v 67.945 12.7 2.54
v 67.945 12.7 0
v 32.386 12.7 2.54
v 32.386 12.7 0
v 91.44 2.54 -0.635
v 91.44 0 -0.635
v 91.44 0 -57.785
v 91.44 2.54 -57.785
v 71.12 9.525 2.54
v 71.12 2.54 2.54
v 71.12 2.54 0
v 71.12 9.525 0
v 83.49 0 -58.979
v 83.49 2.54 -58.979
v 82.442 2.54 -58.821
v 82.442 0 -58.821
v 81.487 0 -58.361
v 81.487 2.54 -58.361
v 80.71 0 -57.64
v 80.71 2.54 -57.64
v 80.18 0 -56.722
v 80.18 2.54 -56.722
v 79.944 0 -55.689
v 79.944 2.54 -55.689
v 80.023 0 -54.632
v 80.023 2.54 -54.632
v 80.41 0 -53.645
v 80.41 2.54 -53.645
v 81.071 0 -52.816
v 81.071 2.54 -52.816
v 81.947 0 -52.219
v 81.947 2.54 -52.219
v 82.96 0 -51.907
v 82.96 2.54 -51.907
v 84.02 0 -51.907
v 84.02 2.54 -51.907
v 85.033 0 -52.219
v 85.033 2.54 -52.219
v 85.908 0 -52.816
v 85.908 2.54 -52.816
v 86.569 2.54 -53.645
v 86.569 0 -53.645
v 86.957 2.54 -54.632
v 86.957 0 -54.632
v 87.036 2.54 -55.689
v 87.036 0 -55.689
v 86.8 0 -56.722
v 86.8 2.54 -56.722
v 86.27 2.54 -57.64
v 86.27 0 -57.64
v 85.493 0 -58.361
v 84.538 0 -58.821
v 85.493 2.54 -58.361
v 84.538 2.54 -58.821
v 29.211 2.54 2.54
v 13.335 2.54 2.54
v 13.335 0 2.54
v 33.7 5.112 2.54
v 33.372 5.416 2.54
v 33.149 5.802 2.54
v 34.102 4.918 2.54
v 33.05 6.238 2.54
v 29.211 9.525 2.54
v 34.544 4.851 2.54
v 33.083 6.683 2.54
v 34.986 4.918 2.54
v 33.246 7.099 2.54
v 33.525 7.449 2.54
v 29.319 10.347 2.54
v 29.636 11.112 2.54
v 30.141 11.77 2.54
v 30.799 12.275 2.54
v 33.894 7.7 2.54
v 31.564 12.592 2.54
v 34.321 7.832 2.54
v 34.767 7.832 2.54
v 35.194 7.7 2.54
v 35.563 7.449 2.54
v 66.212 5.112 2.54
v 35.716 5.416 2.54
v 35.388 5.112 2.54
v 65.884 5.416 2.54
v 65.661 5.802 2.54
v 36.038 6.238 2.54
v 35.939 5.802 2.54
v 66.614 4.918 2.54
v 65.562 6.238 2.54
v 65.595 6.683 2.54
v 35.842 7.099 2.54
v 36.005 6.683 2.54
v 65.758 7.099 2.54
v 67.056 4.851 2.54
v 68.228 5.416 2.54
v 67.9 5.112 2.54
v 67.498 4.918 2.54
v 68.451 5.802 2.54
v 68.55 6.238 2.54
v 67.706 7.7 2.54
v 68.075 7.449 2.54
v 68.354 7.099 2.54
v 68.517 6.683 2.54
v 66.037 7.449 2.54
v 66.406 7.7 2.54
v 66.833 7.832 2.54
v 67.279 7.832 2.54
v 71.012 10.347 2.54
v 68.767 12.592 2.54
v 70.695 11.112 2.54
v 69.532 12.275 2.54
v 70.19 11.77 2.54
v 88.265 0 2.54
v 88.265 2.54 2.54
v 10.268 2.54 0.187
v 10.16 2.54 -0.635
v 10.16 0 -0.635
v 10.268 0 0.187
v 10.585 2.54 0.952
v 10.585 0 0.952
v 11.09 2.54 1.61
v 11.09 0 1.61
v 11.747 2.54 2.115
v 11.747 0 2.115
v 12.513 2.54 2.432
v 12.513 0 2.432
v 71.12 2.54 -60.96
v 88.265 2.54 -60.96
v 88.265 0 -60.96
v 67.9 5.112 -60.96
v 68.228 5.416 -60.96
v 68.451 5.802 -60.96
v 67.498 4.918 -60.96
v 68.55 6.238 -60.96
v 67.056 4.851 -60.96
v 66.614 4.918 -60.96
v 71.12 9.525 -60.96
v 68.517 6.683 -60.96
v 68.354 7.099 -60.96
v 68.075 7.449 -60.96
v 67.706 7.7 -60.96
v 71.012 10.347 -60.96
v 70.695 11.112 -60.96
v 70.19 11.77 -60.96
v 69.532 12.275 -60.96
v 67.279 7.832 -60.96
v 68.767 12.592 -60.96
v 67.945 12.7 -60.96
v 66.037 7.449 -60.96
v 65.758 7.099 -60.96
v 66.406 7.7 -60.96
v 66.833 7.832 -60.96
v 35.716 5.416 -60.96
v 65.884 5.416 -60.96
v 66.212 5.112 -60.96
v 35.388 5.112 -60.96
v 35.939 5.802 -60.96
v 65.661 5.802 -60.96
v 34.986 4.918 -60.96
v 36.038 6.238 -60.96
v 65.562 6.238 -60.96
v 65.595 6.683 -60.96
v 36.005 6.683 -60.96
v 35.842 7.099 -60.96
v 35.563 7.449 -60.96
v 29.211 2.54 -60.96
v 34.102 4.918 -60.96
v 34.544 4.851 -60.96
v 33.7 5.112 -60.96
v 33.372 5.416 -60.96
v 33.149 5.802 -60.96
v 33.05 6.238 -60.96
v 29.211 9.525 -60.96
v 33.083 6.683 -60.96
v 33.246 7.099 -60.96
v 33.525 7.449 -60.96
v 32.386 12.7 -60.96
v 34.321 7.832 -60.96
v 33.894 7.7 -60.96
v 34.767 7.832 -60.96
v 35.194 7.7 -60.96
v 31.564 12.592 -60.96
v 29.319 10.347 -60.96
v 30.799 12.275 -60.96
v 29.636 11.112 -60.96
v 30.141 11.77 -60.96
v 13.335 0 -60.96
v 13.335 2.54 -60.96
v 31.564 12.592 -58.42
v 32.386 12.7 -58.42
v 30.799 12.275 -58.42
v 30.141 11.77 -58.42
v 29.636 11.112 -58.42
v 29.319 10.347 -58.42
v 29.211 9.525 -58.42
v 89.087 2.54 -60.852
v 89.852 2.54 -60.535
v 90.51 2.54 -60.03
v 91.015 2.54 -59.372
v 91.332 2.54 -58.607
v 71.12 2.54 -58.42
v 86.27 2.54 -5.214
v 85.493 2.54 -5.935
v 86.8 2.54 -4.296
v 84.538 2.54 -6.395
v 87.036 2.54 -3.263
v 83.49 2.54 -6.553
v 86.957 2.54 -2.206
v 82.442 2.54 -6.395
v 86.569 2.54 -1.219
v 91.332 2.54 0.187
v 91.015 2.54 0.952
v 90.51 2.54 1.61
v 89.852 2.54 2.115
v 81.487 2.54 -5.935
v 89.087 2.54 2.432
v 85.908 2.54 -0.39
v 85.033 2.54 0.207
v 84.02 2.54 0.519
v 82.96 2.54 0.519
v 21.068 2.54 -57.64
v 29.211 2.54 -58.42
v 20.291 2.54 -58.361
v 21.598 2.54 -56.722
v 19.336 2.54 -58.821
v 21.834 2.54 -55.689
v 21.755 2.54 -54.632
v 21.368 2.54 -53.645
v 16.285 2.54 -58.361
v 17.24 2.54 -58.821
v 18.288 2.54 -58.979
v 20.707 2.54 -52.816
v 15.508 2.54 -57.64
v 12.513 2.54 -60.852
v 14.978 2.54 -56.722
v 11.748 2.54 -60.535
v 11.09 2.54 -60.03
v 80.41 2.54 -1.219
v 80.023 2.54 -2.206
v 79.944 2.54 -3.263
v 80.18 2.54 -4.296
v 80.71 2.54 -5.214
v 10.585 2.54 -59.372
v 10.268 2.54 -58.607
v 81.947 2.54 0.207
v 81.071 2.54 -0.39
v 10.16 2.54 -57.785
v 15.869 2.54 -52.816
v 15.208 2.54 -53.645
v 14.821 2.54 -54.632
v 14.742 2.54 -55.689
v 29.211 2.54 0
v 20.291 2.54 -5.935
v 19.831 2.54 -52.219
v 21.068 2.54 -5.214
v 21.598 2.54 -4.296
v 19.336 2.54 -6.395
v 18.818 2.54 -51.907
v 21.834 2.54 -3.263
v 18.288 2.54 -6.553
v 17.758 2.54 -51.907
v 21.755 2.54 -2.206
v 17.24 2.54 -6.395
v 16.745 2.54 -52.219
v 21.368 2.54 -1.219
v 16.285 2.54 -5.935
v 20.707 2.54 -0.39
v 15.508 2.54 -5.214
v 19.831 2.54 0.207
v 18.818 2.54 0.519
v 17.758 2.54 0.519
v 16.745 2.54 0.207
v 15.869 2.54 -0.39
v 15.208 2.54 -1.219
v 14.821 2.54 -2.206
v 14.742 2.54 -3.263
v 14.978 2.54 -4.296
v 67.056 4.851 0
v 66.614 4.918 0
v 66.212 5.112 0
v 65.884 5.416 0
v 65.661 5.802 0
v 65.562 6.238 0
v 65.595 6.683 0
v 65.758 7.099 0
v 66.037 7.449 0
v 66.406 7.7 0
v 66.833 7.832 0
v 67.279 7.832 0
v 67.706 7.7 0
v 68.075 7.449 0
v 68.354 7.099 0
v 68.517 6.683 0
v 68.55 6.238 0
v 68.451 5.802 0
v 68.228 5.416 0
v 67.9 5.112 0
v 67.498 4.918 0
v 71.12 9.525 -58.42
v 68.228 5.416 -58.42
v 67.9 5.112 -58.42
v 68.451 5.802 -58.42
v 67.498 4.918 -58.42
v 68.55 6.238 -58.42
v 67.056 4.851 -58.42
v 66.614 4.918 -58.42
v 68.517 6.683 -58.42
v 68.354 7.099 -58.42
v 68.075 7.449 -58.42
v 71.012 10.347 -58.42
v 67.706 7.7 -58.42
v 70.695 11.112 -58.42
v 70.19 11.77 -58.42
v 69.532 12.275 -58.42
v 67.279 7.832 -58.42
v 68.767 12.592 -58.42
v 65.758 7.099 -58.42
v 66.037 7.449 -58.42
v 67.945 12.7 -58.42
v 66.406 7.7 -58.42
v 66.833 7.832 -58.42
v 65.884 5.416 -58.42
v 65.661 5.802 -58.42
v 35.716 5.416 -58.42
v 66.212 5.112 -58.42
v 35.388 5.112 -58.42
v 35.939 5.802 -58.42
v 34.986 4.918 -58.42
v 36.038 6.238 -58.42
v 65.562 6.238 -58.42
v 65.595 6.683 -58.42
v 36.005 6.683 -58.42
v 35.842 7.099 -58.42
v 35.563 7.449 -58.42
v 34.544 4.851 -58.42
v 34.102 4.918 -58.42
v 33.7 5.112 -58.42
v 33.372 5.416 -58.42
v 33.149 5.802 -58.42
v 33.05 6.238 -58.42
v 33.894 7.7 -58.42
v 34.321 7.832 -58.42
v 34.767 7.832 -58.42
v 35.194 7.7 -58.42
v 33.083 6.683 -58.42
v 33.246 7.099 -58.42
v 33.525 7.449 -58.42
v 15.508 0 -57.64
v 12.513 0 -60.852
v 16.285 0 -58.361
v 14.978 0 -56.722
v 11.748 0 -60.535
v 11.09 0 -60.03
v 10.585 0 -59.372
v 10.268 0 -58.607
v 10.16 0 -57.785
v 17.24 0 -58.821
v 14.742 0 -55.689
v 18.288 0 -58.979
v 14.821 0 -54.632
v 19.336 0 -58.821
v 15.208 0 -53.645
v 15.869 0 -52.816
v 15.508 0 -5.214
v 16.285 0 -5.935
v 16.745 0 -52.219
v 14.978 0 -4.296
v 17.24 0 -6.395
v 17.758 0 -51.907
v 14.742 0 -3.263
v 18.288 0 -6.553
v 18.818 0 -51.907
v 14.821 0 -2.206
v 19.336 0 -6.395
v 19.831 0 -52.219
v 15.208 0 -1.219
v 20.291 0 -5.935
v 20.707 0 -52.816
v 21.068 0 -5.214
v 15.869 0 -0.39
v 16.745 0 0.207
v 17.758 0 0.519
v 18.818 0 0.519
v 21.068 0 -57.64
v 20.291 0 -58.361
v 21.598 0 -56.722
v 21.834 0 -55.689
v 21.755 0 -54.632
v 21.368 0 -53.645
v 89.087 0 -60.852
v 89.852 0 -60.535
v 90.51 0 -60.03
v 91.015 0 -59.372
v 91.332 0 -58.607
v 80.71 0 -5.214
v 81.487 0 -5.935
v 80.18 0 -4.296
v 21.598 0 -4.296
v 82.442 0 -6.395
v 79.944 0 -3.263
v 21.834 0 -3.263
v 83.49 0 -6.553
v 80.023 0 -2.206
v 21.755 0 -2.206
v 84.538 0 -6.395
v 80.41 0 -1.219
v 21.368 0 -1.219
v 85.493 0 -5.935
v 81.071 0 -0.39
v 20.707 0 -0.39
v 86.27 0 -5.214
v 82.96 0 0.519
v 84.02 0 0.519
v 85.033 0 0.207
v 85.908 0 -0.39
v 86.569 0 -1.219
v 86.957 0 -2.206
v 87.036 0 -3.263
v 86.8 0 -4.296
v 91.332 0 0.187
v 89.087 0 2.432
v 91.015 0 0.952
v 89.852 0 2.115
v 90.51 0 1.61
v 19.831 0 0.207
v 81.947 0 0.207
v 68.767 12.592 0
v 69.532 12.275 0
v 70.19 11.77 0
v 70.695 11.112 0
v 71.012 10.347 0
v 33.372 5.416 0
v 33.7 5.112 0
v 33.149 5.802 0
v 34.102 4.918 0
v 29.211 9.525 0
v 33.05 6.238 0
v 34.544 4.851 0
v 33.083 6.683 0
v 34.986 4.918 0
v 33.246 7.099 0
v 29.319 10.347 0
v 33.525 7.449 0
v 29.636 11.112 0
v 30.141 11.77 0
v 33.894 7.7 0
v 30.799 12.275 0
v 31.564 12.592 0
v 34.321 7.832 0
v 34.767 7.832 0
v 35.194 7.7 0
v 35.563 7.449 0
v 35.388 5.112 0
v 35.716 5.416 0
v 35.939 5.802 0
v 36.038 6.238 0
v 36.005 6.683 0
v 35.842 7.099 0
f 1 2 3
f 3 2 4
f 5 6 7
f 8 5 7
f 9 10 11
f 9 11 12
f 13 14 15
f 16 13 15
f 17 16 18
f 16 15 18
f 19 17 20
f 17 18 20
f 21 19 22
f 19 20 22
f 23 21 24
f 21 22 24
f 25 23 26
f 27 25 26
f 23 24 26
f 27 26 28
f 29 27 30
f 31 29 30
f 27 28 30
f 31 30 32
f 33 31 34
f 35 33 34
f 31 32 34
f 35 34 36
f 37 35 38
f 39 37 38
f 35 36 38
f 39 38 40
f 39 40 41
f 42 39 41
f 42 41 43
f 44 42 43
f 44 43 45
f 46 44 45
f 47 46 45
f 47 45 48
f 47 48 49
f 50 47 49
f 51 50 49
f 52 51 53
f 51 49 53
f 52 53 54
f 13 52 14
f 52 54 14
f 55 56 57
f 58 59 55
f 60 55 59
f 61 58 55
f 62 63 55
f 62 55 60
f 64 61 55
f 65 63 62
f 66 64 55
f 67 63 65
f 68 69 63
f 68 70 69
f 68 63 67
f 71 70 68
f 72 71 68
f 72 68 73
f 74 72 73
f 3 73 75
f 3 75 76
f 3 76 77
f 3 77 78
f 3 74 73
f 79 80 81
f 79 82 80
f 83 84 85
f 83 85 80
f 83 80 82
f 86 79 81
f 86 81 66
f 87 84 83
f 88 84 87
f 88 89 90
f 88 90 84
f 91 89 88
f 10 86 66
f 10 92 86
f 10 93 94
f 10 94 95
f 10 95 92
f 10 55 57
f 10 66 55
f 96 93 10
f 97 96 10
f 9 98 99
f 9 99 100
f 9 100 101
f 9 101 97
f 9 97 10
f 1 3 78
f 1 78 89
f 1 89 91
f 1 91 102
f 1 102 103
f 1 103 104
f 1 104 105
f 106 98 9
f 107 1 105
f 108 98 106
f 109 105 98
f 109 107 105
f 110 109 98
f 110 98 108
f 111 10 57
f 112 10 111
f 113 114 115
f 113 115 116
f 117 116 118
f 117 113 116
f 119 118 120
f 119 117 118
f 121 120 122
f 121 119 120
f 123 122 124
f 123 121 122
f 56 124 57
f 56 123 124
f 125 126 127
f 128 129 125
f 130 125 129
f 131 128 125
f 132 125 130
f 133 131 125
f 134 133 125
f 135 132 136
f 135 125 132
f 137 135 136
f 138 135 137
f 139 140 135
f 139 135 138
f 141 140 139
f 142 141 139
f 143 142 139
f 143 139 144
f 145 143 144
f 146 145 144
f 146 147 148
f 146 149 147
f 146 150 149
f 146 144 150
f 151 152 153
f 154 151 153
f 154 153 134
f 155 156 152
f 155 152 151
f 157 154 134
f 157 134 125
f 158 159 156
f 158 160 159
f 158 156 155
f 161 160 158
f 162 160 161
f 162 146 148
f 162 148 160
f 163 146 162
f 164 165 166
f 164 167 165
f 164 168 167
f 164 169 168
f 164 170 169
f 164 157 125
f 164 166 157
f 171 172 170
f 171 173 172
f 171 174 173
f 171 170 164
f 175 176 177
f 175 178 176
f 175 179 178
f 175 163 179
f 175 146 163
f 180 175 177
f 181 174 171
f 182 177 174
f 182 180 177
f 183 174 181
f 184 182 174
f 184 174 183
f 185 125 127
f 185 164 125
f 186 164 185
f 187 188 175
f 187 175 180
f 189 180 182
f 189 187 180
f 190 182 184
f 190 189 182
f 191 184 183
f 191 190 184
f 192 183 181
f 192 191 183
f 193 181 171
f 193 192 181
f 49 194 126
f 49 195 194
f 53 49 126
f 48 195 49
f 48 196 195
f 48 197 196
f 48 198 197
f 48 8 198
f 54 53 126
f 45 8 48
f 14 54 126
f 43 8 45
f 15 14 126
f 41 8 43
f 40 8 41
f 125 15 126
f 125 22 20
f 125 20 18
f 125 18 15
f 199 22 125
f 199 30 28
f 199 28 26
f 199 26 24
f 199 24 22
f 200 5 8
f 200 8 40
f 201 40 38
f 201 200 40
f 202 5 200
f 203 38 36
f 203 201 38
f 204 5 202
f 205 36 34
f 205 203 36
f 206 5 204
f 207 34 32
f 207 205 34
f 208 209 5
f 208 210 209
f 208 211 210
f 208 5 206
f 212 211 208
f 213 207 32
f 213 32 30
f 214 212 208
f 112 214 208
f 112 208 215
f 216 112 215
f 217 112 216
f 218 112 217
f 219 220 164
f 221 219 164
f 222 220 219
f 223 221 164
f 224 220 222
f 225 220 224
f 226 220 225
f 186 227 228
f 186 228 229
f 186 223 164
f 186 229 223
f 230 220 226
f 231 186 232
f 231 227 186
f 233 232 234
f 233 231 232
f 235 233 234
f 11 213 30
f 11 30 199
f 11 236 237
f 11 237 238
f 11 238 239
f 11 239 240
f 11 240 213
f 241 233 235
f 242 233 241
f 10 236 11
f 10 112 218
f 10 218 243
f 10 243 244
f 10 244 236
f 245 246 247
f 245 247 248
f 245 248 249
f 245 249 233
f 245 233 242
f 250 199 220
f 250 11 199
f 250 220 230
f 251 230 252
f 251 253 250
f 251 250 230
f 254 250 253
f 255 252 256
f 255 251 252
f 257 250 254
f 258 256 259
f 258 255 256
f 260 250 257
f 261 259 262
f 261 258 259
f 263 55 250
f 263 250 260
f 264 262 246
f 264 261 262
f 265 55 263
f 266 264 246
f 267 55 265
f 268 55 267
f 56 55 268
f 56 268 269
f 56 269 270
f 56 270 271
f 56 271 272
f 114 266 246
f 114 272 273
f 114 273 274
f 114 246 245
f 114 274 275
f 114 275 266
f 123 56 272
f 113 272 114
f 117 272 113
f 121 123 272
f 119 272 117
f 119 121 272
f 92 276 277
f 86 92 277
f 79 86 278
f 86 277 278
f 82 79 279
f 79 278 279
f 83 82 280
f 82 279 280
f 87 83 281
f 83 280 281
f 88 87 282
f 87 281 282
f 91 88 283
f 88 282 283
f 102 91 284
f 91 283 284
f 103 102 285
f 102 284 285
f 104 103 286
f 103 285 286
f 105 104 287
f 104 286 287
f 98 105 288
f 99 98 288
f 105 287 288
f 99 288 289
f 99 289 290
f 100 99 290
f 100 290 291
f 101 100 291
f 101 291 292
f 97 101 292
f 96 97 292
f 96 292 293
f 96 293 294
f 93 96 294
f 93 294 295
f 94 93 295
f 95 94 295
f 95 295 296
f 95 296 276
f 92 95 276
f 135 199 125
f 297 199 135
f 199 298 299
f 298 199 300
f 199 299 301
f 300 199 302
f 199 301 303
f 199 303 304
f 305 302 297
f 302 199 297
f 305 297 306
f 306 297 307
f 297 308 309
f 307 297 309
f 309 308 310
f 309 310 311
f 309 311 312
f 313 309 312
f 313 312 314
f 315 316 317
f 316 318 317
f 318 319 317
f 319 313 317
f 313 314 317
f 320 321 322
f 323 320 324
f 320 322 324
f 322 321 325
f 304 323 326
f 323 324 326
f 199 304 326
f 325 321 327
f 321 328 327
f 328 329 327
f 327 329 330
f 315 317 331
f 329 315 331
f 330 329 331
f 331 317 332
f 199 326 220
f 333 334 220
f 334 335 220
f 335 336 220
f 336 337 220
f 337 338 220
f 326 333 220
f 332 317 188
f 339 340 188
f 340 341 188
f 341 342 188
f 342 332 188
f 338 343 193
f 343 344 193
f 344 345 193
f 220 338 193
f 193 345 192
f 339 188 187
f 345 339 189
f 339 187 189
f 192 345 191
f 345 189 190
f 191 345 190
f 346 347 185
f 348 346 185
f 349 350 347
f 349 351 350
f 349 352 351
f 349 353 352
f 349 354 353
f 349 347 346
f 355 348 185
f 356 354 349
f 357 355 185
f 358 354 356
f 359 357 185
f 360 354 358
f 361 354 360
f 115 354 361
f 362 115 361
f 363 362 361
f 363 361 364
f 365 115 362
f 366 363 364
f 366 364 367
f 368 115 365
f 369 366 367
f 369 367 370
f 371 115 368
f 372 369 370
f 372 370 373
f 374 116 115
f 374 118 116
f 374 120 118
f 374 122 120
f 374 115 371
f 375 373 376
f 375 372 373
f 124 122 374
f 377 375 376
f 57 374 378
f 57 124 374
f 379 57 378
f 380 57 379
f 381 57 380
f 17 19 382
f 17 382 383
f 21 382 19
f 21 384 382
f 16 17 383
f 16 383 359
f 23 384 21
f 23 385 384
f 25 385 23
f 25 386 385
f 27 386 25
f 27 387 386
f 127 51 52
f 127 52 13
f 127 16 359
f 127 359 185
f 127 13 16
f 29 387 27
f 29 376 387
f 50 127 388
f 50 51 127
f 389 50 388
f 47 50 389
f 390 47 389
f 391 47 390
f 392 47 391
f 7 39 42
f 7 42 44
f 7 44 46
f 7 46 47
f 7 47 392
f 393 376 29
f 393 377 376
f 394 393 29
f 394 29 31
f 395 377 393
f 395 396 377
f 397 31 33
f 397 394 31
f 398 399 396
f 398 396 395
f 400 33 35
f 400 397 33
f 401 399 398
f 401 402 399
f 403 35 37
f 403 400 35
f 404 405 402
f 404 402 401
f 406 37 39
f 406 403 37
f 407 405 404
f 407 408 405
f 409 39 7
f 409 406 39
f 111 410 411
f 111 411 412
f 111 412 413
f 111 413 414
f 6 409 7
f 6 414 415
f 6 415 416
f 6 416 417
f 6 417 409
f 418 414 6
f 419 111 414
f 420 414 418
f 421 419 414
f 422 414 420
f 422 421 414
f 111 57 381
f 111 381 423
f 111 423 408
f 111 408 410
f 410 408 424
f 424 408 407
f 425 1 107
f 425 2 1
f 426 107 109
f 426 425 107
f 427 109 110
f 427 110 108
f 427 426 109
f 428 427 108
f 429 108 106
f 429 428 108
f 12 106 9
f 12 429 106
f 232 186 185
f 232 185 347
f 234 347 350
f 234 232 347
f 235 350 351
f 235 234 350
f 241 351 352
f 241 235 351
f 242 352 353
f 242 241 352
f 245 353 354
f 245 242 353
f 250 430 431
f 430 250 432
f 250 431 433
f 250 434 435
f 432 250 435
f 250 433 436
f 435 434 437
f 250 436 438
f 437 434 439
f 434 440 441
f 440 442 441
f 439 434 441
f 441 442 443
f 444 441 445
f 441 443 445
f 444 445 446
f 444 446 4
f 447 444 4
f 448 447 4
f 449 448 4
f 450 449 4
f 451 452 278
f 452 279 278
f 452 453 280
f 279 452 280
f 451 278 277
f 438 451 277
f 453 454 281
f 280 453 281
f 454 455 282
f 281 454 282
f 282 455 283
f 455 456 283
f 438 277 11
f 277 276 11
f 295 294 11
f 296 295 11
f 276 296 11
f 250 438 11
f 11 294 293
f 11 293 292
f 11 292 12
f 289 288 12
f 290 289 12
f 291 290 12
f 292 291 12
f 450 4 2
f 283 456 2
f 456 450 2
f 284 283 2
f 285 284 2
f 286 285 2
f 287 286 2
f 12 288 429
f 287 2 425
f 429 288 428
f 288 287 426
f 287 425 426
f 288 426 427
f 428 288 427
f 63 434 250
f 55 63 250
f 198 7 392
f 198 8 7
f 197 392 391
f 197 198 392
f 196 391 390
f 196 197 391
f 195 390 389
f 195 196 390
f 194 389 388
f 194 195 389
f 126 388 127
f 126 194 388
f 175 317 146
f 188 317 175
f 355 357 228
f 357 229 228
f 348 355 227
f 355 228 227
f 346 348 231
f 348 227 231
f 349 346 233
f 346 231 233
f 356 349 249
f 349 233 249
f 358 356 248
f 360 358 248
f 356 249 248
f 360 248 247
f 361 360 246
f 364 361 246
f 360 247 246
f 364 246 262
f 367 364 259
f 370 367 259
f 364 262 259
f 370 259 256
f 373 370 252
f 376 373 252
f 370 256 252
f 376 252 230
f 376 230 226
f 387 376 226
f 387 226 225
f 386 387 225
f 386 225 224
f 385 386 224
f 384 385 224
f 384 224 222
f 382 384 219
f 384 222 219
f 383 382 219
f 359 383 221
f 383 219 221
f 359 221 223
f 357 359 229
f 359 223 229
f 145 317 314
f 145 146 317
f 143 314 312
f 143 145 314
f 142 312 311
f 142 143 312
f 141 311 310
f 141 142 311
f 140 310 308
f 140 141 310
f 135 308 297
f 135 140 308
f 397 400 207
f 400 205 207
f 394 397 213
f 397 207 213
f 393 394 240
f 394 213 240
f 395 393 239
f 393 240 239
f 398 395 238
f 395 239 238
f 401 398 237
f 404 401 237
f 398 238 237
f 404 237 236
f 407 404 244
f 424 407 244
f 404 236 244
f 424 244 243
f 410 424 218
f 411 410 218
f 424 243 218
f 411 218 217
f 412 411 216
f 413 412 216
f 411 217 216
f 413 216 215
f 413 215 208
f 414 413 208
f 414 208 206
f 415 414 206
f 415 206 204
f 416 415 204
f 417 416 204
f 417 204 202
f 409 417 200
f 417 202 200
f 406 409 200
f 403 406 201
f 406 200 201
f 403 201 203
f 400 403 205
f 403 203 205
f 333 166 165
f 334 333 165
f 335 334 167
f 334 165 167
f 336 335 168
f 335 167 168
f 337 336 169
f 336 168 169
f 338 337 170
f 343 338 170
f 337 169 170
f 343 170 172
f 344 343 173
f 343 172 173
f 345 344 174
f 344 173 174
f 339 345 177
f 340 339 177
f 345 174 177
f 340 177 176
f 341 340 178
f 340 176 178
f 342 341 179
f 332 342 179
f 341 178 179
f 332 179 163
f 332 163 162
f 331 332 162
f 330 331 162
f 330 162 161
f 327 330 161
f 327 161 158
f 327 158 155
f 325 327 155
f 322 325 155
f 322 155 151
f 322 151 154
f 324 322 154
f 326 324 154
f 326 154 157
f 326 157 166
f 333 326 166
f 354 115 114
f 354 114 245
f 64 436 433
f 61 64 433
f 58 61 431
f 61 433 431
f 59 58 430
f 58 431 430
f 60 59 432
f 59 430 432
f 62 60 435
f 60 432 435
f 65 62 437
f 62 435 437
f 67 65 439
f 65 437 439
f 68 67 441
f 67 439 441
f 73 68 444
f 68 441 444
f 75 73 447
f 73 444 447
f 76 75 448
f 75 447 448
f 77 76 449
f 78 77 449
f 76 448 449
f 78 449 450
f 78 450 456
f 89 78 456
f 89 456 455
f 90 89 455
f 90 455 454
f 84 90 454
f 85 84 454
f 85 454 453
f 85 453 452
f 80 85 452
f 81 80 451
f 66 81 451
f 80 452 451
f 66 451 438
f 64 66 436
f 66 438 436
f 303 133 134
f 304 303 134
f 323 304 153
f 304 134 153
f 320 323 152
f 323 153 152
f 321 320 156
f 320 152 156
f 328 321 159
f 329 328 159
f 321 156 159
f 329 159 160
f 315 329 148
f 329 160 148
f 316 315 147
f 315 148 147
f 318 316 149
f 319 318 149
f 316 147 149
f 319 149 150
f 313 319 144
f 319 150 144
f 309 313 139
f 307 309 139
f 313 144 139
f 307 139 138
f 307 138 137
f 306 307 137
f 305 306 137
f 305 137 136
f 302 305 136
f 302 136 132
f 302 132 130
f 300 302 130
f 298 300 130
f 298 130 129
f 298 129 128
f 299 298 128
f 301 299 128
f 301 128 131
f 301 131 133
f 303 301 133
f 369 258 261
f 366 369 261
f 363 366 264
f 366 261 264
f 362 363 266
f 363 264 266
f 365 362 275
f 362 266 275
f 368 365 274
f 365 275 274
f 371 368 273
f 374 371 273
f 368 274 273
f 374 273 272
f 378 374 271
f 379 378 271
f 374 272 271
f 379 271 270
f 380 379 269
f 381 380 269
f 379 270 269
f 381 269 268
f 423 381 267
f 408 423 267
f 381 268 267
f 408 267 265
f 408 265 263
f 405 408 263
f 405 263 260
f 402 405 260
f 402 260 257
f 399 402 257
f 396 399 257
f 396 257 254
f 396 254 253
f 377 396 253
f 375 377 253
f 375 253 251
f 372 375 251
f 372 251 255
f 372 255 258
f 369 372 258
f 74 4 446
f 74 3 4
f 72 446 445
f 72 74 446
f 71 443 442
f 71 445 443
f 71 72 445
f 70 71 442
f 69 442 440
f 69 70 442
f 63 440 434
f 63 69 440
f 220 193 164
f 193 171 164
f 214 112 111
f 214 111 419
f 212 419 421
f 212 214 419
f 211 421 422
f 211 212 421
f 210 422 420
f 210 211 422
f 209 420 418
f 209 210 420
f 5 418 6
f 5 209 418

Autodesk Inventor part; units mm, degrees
ref_plane "YZ Plane" through (0, 0, 0) normal (1, 0, 0) x (0, 1, 0)
ref_plane "XZ Plane" through (0, 0, 0) normal (0, 1, 0) x (-1, 0, 0)
ref_plane "XY Plane" through (0, 0, 0) normal (0, 0, 1) x (1, 0, 0)
sketch "Sketch1" plane through (0, 0, 0) normal (0, 0, 1) x (1, 0, 0)
  line L0 (0, 0) -> (101.6, 0)
  line L1 (101.6, 0) -> (101.6, 12.7)
  line L2 (101.6, 12.7) -> (0, 12.7)
  line L3 (0, 12.7) -> (0, 0)
  dimension "d0" = 101.6
  dimension "d1" = 12.7
extrude "Extrusion1" add sketch "Sketch1" along normal blind 2.54
sketch "Sketch2" plane through (0, 0, 0) normal (0, 0, -1) x (-1, 0, 0)
  line L0 (-101.6, 0) -> (-101.6, 12.7) projected
  line L1 (0, 0) -> (-101.6, 0)
  line L2 (-101.6, 0) -> (-101.6, 2.54)
  line L3 (-101.6, 2.54) -> (0, 2.54)
  line L4 (0, 2.54) -> (0, 0)
  dimension "d4" = 2.54
extrude "Extrusion2" add sketch "Sketch2" along normal blind 58.42
sketch "Sketch3" plane through (0, 0, -58.42) normal (0, 0, -1) x (-1, 0, 0)
  line L0 (-101.6, 12.7) -> (0, 12.7) projected
  line L1 (0, 0) -> (-101.6, 0)
  line L2 (-101.6, 0) -> (-101.6, 12.7)
  line L3 (-101.6, 12.7) -> (0, 12.7)
  line L4 (0, 12.7) -> (0, 0)
  dimension "d19" = 101.6
extrude "Extrusion3" add sketch "Sketch3" along normal blind 2.54
sketch "Sketch4" plane through (0, 0, 2.54) normal (0, 0, 1) x (1, 0, 0)
  line L0 (101.6, 12.7) -> (0, 12.7) projected
  line L1 (101.6, 0) -> (101.6, 12.7) projected
  point P0 (0, 0)
  point P1 (67.056, 6.35)
  point P2 (34.544, 6.35)
  dimension "d9" = 32.512
  dimension "d10" = 6.35
  dimension "d11" = 6.35
  dimension "d20" = 34.544
hole "Hole1" at (67.056, 6.35, 2.54) at (34.544, 6.35, 2.54) direction (0, 0, -1) diameter 2.9972 end through all
sketch "Sketch5" plane through (0, 0, 2.54) normal (0, -1, 0) x (1, 0, 0)
  line L0 (101.6, -63.5) -> (101.6, 0) projected
  line L1 (0, 0) -> (101.6, 0) projected
  line L2 (0, 0) -> (0, -63.5) projected
  line L3 (101.6, -63.5) -> (0, -63.5) projected
  point P0 (0, -2.54)
  point P1 (83.4898, -5.5372)
  point P2 (18.288, -5.5372)
  point P3 (18.288, -57.9628)
  point P4 (83.4898, -57.9628)
  dimension "d21" = 18.1102
  dimension "d22" = 5.5372
  dimension "d23" = 5.5372
  dimension "d24" = 18.288
  dimension "d25" = 18.1102
  dimension "d26" = 5.5372
  dimension "d27" = 5.5372
  dimension "d28" = 18.288
hole "Hole2" at (83.4898, 0, -2.9972) at (18.288, 0, -2.9972) at (18.288, 0, -55.4228) at (83.4898, 0, -55.4228) direction (0, 1, 0) diameter 7.112 end through all
sketch "Sketch6" plane through (0, 0, 2.54) normal (0, 0, 1) x (1, 0, 0)
  circle A0 centre (34.544, 6.35) radius 1.4986 projected
  line L0 (33.0454, 6.35) -> (18.288, 6.35)
  circle A1 centre (67.056, 6.35) radius 1.4986 projected
  line L1 (68.5546, 6.35) -> (83.4898, 6.35)
  line L2 (68.5546, 6.35) -> (83.4898, 6.35) construction
  point P0 (0, 0)
  dimension "d36" = 14.7574
  dimension "d37" = 14.9352
  dimension "d38" = 0
sketch "Sketch8" plane through (0, 0, -60.96) normal (0, 0, -1) x (-1, 0, 0)
  line L0 (0, 0) -> (0, 2.54)
  line L1 (0, 0) -> (0, 12.7) projected
  line L2 (0, 12.7) -> (-29.211, 12.7)
  line L3 (-29.211, 12.7) -> (-29.211, 2.54)
  line L4 (-29.211, 2.54) -> (0, 2.54)
  line L5 (0, 2.54) -> (0, 12.7)
  dimension "d39" = 2.54
  dimension "d51" = 29.211
extrude "Extrusion4" cut sketch "Sketch8" against normal through all
sketch "Sketch9" plane through (0, 0, 2.54) normal (0, -1, 0) x (1, 0, 0)
  line L0 (0, -63.5) -> (29.211, -63.5) projected
  line L1 (0, 0) -> (10.16, 0)
  line L2 (10.16, 0) -> (10.16, -63.5)
  line L3 (10.16, -63.5) -> (0, -63.5)
  line L4 (0, -63.5) -> (0, 0)
  line L5 (101.6, -2.54) -> (101.6, 0) projected
  line L6 (29.211, -63.5) -> (101.6, -63.5) projected
  line L7 (101.6, 0) -> (91.44, 0)
  line L8 (91.44, 0) -> (91.44, -63.5)
  line L9 (91.44, -63.5) -> (101.6, -63.5)
  line L10 (101.6, -63.5) -> (101.6, 0)
  point P0 (0, -2.54)
  dimension "d42" = 10.16
  dimension "d43" = 10.16
extrude "Extrusion5" cut sketch "Sketch9" against normal blind 25.4
sketch "Sketch10" plane through (0, 0, 2.54) normal (0, 0, 1) x (1, 0, 0)
  line L0 (10.16, 0) -> (91.44, 0) projected
  line L1 (91.44, 0) -> (91.44, 2.54)
  line L2 (91.44, 12.7) -> (29.211, 12.7) projected
  line L3 (91.44, 2.54) -> (71.12, 2.54)
  line L4 (71.12, 2.54) -> (71.12, 12.7)
  line L5 (71.12, 12.7) -> (91.44, 12.7)
  line L6 (91.44, 12.7) -> (91.44, 2.54)
  point P0 (0, 0)
  dimension "d46" = 2.54
  dimension "d47" = 20.32
extrude "Extrusion6" cut sketch "Sketch10" against normal through all
fillet "Fillet1" radius 3.175 8 edges at (71.12, 12.7, 1.27) (29.211, 12.7, 1.27) (10.16, 1.27, -60.96) (10.16, 1.27, 2.54) (29.211, 12.7, -59.69) (71.12, 12.7, -59.69) (91.44, 1.27, -60.96) (91.44, 1.27, 2.54)
equation "\"d11\" = d10"
equation "\"d23\" = d22"
equation "\"d25\" = d21"
equation "\"d26\" = d22"
equation "\"d27\" = d22"
equation "\"d28\" = d24"
equation "\"d43\" = d42"
properties part number "track guide u channel"
